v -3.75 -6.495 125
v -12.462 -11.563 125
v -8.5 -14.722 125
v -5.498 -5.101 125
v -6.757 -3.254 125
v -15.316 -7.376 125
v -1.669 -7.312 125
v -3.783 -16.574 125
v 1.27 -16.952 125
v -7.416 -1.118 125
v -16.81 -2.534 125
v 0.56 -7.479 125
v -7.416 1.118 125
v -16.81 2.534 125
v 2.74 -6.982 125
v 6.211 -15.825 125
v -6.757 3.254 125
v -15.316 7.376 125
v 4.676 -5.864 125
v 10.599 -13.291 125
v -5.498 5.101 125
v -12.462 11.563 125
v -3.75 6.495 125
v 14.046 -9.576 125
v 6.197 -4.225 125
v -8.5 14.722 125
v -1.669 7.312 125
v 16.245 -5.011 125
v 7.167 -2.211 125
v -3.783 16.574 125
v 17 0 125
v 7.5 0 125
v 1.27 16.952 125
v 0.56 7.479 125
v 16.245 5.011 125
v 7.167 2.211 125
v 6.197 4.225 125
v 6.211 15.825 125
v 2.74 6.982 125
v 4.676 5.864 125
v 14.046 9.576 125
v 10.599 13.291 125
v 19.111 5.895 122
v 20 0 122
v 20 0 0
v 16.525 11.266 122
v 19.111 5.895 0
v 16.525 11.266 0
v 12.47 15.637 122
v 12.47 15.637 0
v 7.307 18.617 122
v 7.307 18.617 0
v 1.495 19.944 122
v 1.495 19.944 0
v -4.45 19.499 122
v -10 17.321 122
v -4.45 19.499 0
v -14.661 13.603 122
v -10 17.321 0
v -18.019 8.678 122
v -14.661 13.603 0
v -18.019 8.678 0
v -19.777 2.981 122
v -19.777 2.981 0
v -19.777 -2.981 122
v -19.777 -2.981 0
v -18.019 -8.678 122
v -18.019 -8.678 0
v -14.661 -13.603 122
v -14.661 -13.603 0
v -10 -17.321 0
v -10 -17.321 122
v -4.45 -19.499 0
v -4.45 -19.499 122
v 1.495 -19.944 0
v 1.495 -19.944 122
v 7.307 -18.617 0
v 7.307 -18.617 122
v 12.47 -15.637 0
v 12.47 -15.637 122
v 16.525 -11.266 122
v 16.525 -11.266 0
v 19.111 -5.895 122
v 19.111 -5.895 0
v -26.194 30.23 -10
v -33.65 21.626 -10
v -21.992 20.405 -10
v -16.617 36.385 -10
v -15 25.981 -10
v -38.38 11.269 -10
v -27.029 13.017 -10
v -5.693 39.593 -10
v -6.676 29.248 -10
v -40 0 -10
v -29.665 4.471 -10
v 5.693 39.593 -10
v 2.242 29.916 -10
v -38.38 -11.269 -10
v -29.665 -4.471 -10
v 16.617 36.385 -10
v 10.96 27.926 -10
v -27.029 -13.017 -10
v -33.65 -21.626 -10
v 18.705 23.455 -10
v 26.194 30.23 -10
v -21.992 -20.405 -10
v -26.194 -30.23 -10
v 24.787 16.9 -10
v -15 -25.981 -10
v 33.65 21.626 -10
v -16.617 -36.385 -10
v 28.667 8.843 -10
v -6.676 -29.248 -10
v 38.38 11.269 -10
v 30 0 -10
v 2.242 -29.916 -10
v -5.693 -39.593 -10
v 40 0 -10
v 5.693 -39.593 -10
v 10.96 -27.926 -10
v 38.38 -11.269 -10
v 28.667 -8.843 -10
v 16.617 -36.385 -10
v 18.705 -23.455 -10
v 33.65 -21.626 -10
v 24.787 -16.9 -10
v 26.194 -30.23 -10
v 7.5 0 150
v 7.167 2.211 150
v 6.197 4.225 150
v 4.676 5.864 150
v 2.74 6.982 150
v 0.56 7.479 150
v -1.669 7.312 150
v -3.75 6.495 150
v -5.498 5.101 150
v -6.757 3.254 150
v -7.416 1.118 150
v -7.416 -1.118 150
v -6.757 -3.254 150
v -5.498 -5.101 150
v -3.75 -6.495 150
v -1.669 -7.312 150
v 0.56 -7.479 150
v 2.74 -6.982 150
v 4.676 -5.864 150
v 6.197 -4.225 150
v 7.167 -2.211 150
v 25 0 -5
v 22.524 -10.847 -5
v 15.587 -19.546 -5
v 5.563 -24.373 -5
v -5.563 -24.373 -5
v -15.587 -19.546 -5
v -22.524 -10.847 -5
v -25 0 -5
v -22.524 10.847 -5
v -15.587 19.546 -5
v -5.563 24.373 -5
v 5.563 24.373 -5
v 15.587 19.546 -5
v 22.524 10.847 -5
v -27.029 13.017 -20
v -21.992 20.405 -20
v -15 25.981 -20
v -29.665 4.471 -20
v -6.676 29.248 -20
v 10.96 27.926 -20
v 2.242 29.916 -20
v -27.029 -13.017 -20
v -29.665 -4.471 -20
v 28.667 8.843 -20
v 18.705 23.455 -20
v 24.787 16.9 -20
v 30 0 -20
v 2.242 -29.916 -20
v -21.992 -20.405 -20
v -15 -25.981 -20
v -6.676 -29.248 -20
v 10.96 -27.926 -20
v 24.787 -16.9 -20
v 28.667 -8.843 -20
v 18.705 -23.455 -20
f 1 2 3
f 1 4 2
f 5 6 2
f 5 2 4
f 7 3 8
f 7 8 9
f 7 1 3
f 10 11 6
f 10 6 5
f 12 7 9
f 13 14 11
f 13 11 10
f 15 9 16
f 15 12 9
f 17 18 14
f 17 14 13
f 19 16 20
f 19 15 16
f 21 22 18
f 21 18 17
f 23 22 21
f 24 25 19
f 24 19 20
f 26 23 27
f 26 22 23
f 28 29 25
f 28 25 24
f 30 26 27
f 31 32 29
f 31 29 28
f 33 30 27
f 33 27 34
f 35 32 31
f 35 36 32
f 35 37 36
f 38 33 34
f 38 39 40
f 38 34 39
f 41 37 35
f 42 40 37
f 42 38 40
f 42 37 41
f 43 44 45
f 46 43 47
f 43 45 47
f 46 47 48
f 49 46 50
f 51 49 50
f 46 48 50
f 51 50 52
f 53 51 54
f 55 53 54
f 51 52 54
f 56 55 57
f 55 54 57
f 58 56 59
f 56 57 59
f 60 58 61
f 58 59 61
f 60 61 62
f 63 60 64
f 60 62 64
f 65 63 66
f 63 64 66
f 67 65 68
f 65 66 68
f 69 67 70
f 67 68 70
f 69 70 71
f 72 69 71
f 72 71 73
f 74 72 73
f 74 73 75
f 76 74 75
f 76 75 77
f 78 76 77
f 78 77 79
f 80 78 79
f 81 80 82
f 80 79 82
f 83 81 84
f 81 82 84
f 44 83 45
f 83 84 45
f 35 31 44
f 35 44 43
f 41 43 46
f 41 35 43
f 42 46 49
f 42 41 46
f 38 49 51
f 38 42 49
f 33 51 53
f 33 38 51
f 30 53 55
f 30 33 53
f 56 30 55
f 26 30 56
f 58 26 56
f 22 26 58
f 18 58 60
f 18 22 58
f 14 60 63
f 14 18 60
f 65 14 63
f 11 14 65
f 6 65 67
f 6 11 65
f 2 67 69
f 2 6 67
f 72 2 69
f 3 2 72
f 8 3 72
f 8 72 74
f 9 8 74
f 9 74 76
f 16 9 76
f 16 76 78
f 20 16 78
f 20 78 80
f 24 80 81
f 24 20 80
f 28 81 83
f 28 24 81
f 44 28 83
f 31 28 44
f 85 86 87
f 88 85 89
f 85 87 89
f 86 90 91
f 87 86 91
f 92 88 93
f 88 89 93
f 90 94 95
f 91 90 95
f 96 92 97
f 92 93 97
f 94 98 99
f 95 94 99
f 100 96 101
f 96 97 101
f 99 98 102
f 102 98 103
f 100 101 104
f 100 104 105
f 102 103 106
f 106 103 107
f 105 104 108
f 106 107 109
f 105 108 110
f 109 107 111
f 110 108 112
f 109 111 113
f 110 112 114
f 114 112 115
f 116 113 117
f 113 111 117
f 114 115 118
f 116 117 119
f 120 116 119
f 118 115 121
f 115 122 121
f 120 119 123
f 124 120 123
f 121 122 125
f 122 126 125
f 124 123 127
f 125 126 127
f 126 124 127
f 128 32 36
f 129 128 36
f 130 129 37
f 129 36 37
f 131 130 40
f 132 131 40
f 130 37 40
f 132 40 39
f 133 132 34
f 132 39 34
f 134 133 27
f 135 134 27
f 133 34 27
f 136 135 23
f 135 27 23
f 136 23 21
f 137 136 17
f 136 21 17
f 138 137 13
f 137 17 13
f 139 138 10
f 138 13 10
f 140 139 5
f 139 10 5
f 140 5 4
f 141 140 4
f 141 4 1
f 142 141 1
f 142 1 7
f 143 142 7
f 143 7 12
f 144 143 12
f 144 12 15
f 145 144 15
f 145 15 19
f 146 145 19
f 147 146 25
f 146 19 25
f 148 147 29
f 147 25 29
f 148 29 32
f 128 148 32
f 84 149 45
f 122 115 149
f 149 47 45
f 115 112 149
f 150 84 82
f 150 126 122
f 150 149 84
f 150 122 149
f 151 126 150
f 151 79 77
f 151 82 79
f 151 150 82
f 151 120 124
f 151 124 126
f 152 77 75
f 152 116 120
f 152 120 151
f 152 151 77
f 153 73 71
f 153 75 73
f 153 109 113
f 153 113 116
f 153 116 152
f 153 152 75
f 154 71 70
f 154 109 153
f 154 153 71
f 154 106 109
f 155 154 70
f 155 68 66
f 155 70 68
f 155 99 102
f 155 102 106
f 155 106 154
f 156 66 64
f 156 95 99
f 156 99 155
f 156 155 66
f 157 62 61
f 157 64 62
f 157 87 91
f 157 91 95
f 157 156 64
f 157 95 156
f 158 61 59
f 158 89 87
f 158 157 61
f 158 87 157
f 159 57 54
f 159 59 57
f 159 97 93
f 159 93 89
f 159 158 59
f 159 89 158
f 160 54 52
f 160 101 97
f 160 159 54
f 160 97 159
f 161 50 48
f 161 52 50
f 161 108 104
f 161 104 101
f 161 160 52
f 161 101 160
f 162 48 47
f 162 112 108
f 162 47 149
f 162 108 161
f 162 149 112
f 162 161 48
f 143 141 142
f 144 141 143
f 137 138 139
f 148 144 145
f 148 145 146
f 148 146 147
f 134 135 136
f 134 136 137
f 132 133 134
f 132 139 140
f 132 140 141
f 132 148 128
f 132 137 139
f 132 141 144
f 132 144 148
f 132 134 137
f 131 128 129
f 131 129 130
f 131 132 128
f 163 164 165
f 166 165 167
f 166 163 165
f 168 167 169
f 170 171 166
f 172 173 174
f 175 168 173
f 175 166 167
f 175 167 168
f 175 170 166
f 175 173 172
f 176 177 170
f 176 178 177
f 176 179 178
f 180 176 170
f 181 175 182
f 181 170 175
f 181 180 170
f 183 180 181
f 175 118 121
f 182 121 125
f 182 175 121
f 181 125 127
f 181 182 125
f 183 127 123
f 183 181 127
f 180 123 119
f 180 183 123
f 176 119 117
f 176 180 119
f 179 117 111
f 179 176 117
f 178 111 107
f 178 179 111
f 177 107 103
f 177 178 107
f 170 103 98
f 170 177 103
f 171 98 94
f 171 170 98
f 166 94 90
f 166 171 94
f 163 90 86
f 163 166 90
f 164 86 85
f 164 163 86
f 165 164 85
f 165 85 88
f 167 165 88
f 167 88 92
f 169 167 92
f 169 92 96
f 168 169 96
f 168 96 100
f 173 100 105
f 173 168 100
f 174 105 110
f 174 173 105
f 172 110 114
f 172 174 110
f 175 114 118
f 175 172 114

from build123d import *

# Parameters (mm, degrees)
F0_R     = 20
F1_DEPTH = 125
F2_R     = 7.5
F3_DEPTH = 25
F4_R     = 20
F5_DEPTH = 10
F5_TAPER = -45
F6_R     = 40
F6_R_2   = 30
F7_DEPTH = 10
F7_TAPER = 45
F8_SIZE2 = 3
F8_SIZE  = 3


with BuildPart() as f1:
    # F0 (on Top) → F1 (new body)
    with BuildSketch(Plane.XY):
        Circle(F0_R)
    extrude(amount=F1_DEPTH)

    # F2 (on face) → F3 (join)
    with BuildSketch(Plane.XY.offset(125)):
        Circle(F2_R)
    extrude(amount=F3_DEPTH)

    # F4 (on face) → F5 (join)
    with BuildSketch(Plane(origin=(0, 0, 0), x_dir=(1, 0, 0), z_dir=(0, 0, -1))):
        Circle(F4_R)
    extrude(amount=F5_DEPTH, taper=F5_TAPER)

    # F6 (on face) → F7 (join)
    with BuildSketch(Plane(origin=(0, 0, -10), x_dir=(1, 0, 0), z_dir=(0, 0, -1))):
        Circle(F6_R)
        Circle(F6_R_2, mode=Mode.SUBTRACT)
        Circle(F6_R_2)
    extrude(amount=F7_DEPTH, taper=F7_TAPER)

    # F8
    f8_edges = [f1.edges().sort_by_distance(p)[0] for p in [
        (-20, 0, 125),
    ]]
    chamfer(f8_edges, length=F8_SIZE, length2=F8_SIZE2)


solid = f1.part
